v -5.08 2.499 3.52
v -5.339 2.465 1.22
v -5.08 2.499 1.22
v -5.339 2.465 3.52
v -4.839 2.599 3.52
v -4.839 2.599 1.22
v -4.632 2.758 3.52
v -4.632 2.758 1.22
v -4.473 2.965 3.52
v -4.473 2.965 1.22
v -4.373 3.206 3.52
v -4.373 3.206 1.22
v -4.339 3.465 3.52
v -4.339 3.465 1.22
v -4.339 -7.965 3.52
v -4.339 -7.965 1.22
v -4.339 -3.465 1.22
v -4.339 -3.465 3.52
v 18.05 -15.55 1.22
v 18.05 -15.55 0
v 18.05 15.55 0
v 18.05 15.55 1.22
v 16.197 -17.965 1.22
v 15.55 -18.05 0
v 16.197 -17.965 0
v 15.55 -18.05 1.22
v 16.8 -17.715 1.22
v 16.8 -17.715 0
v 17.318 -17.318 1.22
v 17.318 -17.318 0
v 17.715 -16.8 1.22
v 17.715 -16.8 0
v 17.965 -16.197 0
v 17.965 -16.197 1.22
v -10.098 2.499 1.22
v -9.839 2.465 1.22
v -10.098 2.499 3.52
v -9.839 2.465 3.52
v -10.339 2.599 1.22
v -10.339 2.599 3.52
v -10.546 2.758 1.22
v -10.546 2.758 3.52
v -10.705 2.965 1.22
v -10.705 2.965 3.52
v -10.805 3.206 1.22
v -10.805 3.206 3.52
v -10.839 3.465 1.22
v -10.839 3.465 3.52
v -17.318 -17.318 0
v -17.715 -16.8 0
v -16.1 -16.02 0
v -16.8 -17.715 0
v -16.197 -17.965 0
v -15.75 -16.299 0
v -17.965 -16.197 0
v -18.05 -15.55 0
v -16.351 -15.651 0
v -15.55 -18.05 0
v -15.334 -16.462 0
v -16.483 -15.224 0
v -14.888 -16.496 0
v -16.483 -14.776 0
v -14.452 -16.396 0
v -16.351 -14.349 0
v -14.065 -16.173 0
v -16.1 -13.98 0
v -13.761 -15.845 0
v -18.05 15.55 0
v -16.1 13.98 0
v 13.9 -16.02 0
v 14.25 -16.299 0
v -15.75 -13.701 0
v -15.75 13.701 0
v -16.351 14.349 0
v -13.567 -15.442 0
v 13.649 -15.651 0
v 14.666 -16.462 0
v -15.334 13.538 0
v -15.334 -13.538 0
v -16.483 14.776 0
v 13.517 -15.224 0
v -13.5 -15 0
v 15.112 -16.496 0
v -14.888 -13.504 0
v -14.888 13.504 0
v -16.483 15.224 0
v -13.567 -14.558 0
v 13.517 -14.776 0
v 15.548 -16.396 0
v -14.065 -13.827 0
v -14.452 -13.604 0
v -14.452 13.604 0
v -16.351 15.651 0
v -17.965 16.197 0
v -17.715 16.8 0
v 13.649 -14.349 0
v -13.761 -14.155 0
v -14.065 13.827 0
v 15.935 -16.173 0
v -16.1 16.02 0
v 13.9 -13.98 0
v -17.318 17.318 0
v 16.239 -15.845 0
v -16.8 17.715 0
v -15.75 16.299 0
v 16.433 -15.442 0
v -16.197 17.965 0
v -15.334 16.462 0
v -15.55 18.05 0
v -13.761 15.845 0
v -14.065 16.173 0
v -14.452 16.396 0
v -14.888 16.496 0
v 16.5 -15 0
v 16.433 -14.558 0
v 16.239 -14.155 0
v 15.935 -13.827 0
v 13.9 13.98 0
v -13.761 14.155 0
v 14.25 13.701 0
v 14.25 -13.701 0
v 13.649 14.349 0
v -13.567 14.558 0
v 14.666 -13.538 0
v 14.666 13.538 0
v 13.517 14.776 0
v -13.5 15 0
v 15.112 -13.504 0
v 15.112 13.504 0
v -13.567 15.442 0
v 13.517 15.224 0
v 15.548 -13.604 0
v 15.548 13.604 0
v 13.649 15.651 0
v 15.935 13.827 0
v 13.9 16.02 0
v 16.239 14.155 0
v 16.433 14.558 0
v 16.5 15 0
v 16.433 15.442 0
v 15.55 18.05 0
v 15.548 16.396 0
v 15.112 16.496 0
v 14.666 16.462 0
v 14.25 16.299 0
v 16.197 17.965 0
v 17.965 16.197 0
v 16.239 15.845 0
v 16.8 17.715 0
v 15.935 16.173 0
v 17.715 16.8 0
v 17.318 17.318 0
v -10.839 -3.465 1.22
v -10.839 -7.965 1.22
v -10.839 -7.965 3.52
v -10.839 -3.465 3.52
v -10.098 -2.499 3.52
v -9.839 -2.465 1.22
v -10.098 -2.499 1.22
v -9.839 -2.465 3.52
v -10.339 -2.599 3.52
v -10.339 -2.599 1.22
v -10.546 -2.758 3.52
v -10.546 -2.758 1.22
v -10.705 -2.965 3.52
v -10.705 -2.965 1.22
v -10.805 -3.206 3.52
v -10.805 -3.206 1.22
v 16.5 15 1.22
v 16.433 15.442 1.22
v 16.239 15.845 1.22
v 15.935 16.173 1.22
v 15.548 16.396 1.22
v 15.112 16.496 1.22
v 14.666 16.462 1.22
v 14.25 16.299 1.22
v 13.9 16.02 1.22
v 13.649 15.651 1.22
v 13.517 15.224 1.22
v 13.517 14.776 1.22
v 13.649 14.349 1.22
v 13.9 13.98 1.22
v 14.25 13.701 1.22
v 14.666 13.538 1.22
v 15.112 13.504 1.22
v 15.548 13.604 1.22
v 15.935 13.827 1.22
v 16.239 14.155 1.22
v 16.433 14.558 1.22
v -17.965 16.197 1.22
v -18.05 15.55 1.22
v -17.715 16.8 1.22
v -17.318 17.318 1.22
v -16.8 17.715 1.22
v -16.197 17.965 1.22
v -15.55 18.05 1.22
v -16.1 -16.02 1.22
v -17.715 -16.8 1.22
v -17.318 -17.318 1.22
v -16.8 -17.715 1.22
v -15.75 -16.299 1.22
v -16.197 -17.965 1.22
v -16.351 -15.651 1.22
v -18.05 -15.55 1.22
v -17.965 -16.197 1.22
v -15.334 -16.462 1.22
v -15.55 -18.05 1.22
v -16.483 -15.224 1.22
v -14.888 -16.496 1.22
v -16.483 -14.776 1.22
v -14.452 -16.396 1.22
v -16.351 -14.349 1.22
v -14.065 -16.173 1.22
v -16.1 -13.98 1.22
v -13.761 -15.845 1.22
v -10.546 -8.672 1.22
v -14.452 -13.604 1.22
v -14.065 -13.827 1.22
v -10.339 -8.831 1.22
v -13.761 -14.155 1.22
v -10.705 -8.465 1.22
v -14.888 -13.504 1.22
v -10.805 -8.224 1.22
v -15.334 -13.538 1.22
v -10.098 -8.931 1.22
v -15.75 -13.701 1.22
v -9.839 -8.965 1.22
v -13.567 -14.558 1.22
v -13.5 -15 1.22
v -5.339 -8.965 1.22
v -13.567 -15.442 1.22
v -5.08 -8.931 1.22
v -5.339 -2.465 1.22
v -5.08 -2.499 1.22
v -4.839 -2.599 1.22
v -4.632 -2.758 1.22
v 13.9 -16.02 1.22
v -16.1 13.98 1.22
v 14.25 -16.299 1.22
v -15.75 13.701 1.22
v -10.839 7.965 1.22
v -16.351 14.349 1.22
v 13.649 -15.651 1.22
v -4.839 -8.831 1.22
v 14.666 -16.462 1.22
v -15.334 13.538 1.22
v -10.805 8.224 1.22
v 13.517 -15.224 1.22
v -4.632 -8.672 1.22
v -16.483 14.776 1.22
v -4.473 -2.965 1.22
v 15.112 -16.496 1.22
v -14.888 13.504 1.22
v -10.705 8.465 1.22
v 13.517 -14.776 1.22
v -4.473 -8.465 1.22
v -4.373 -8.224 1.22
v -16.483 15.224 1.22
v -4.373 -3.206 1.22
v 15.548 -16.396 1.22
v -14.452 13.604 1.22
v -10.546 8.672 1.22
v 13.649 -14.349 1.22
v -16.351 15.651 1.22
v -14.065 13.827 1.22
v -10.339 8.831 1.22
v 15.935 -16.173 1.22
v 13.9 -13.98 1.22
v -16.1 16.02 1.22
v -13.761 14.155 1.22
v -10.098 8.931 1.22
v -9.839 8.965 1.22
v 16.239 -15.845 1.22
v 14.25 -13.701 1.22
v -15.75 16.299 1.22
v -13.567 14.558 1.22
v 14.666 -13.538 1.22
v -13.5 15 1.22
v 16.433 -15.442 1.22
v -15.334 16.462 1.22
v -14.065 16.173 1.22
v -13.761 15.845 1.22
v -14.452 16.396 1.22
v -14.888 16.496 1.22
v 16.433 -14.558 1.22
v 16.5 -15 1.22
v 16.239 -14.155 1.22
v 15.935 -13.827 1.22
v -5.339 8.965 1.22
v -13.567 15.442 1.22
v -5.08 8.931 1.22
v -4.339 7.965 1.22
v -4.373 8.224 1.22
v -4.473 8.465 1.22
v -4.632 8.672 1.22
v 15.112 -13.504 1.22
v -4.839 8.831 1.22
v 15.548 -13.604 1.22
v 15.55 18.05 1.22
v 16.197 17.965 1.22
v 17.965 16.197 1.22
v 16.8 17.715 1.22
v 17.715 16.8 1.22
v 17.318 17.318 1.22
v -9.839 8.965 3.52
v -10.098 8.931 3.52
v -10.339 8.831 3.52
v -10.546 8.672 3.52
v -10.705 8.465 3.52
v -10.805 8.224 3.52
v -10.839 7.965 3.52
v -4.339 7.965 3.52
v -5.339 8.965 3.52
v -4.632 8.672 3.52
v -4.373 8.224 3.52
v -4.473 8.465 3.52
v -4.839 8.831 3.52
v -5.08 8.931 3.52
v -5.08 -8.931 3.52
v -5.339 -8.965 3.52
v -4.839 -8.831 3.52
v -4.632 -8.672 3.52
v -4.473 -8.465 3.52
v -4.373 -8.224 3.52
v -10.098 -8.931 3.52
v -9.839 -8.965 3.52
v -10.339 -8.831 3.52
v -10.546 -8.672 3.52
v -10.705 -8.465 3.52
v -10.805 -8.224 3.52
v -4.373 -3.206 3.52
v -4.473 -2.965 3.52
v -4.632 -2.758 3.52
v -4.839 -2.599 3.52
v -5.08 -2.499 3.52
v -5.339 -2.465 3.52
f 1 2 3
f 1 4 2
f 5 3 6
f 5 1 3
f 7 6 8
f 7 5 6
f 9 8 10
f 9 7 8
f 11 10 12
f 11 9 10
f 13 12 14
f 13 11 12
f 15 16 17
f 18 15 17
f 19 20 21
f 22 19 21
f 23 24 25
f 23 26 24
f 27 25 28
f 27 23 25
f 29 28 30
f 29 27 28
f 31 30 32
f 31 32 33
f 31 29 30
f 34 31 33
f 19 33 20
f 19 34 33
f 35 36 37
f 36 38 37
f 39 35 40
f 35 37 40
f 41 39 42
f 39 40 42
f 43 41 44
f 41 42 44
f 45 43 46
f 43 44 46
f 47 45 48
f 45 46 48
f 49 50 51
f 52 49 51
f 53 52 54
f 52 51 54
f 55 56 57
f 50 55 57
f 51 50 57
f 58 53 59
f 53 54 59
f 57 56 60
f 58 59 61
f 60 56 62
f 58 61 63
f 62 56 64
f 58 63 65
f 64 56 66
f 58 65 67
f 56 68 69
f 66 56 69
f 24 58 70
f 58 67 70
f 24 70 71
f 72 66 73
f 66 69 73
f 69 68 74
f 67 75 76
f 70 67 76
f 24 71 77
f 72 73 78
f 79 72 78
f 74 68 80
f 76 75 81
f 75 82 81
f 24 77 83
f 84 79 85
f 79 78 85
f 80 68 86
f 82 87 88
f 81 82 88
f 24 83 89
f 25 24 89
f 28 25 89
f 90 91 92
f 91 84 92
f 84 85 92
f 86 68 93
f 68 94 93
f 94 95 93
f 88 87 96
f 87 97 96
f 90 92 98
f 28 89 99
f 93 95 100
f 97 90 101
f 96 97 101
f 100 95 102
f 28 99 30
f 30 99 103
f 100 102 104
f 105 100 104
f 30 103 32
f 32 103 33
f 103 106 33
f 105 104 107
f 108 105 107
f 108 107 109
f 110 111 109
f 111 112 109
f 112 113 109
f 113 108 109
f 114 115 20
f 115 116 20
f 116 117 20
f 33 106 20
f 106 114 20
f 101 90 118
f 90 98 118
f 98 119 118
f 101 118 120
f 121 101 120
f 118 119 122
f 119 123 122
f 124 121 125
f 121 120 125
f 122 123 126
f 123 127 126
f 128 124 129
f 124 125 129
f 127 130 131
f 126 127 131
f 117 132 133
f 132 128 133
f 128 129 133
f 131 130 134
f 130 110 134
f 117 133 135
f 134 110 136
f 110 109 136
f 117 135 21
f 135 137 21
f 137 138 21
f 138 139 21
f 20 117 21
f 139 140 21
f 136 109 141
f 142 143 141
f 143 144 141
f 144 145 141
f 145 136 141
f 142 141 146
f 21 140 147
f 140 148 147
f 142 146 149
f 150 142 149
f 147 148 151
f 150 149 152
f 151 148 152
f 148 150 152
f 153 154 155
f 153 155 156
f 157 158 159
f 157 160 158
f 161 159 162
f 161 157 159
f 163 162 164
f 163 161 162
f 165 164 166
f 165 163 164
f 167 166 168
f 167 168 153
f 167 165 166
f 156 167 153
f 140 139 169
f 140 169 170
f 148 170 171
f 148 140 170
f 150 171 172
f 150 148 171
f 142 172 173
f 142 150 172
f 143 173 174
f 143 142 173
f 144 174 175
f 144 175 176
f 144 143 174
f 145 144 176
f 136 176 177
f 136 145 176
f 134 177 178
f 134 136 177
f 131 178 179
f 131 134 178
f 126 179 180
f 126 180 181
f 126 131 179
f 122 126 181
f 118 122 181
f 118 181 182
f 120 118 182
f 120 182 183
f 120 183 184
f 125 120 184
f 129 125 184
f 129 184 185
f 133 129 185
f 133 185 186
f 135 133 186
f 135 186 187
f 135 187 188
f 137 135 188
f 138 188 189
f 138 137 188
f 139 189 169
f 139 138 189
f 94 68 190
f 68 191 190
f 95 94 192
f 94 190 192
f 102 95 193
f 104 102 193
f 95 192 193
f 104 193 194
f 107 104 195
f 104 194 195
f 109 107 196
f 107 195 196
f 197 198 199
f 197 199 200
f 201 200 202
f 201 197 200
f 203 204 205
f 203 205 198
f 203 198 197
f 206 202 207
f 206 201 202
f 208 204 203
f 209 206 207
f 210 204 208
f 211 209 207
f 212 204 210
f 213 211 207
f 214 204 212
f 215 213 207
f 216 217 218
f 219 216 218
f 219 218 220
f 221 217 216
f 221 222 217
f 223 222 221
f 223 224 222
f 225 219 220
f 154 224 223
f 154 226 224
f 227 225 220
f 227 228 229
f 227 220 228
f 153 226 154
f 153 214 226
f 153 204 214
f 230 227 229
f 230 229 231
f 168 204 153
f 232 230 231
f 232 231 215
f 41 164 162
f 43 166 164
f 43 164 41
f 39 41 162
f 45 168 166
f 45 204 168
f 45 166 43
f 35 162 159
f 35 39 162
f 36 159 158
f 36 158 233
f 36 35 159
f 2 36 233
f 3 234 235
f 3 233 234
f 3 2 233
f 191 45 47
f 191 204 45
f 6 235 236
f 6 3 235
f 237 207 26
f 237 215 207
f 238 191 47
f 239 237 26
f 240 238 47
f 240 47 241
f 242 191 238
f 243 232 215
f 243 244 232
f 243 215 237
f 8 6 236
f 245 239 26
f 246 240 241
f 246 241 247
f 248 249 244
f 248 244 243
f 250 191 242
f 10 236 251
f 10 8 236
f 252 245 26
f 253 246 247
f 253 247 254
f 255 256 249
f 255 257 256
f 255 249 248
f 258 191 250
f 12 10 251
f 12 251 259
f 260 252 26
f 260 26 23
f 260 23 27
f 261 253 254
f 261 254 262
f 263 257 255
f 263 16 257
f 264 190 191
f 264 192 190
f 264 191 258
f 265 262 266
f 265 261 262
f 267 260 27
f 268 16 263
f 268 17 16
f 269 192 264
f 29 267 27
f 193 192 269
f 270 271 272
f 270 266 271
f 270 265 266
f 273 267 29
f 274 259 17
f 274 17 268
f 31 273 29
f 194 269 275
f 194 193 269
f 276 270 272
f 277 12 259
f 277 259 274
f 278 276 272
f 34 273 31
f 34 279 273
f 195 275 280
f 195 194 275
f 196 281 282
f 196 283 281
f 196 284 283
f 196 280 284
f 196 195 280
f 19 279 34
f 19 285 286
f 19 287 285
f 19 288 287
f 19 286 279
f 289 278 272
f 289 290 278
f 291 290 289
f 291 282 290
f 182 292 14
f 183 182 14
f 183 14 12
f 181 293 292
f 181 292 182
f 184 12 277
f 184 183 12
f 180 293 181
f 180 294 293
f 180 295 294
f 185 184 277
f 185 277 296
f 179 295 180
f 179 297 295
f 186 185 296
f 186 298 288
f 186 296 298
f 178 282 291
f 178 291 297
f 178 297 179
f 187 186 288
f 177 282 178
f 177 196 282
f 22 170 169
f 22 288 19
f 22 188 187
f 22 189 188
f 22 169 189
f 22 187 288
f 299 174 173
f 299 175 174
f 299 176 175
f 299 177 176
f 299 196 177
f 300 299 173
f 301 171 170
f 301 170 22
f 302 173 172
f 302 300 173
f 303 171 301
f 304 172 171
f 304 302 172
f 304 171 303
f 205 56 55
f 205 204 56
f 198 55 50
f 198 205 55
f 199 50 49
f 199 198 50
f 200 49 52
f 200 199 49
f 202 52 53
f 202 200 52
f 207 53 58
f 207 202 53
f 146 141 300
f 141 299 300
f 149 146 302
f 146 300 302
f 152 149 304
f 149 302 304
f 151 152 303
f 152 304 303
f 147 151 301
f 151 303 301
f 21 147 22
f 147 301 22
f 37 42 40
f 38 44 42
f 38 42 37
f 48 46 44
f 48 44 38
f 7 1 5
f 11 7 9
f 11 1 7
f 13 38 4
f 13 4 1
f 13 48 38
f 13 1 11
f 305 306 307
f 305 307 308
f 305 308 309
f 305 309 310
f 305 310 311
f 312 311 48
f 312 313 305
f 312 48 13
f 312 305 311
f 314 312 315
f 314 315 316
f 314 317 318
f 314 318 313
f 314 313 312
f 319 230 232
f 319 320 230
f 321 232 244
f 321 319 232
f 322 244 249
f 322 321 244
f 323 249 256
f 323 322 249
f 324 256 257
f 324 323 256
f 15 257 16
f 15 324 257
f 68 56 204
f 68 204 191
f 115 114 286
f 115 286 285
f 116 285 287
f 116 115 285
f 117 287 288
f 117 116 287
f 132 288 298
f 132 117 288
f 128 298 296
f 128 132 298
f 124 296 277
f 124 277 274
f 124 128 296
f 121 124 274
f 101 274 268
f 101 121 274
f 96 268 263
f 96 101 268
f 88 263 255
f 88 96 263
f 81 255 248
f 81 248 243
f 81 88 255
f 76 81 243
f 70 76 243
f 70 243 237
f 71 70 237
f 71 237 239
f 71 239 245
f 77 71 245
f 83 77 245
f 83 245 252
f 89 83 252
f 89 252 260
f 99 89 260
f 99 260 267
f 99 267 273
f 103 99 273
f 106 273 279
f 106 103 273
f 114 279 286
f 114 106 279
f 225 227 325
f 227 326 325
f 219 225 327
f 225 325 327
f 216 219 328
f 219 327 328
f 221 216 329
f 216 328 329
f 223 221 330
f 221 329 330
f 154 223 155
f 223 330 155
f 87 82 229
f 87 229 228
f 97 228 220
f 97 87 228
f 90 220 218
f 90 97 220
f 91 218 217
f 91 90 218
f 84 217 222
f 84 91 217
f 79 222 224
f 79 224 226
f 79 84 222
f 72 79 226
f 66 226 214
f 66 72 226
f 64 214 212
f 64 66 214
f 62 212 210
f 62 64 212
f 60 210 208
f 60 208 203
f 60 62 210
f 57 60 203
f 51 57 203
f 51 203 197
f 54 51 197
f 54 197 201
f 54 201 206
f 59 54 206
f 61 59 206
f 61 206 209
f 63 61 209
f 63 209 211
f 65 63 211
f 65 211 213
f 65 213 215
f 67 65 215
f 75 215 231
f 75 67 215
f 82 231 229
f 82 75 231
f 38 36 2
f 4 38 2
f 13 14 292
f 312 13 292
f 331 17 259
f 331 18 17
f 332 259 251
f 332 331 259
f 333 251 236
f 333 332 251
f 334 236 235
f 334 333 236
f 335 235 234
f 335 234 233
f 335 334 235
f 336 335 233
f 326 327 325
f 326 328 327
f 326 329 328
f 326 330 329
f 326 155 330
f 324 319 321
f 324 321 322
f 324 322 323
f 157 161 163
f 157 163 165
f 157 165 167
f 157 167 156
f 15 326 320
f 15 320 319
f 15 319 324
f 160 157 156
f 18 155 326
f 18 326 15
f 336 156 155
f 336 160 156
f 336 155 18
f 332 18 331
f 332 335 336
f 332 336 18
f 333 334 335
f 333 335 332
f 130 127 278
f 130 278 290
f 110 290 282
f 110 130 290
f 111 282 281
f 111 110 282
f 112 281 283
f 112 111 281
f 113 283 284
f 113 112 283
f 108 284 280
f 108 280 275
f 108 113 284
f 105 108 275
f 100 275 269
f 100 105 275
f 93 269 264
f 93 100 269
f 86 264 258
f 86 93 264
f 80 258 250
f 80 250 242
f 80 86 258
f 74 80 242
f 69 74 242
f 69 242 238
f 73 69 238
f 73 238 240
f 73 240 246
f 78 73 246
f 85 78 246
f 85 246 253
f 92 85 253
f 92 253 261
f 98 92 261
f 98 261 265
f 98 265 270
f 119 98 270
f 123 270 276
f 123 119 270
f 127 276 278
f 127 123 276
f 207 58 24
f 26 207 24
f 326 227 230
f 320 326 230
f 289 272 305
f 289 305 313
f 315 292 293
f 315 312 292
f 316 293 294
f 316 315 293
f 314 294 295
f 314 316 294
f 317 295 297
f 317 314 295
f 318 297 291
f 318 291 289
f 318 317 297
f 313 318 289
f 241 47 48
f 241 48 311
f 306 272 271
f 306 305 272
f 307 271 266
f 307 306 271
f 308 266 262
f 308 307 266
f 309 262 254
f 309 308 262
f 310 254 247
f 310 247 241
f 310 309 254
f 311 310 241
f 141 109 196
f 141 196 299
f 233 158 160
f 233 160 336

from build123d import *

# Parameters (mm, degrees)
F0_W     = 36.1
F0_H     = 36.1
F0_R     = 1.5
F1_DEPTH = 1.22
F2_R     = 2.5
F3_W     = 6.5
F3_H     = 6.5
F4_DEPTH = 2.3
F5_R     = 1


with BuildPart() as f1:
    # F0 (on Top) → F1 (new body)
    with BuildSketch(Plane.XY):
        Rectangle(F0_W, F0_H)
        with Locations((-15, -15)):
            Circle(F0_R, mode=Mode.SUBTRACT)
        with Locations((15, -15)):
            Circle(F0_R, mode=Mode.SUBTRACT)
        with Locations((-15, 15)):
            Circle(F0_R, mode=Mode.SUBTRACT)
        with Locations((15, 15)):
            Circle(F0_R, mode=Mode.SUBTRACT)
    extrude(amount=F1_DEPTH)

    # F2
    f2_edges = [f1.edges().sort_by_distance(p)[0] for p in [
        (18.05, 18.05, 0.61),
        (18.05, -18.05, 0.61),
        (-18.05, -18.05, 0.61),
        (-18.05, 18.05, 0.61),
    ]]
    fillet(f2_edges, radius=F2_R)

    # F3 (on face) → F4 (join)
    with BuildSketch(Plane.XY.offset(1.22)):
        with Locations((-7.588814, -5.71497)):
            Rectangle(F3_W, F3_H)
        with Locations((-7.588814, 5.71497)):
            Rectangle(F3_W, F3_H)
    extrude(amount=F4_DEPTH)

    # F5
    f5_edges = [f1.edges().sort_by_distance(p)[0] for p in [
        (-10.838814, -8.96497, 2.37),
        (-4.338814, -8.96497, 2.37),
        (-4.338814, -2.46497, 2.37),
        (-10.838814, -2.46497, 2.37),
        (-10.838814, 8.96497, 2.37),
        (-10.838814, 2.46497, 2.37),
        (-4.338814, 8.96497, 2.37),
        (-4.338814, 2.46497, 2.37),
    ]]
    fillet(f5_edges, radius=F5_R)


solid = f1.part
